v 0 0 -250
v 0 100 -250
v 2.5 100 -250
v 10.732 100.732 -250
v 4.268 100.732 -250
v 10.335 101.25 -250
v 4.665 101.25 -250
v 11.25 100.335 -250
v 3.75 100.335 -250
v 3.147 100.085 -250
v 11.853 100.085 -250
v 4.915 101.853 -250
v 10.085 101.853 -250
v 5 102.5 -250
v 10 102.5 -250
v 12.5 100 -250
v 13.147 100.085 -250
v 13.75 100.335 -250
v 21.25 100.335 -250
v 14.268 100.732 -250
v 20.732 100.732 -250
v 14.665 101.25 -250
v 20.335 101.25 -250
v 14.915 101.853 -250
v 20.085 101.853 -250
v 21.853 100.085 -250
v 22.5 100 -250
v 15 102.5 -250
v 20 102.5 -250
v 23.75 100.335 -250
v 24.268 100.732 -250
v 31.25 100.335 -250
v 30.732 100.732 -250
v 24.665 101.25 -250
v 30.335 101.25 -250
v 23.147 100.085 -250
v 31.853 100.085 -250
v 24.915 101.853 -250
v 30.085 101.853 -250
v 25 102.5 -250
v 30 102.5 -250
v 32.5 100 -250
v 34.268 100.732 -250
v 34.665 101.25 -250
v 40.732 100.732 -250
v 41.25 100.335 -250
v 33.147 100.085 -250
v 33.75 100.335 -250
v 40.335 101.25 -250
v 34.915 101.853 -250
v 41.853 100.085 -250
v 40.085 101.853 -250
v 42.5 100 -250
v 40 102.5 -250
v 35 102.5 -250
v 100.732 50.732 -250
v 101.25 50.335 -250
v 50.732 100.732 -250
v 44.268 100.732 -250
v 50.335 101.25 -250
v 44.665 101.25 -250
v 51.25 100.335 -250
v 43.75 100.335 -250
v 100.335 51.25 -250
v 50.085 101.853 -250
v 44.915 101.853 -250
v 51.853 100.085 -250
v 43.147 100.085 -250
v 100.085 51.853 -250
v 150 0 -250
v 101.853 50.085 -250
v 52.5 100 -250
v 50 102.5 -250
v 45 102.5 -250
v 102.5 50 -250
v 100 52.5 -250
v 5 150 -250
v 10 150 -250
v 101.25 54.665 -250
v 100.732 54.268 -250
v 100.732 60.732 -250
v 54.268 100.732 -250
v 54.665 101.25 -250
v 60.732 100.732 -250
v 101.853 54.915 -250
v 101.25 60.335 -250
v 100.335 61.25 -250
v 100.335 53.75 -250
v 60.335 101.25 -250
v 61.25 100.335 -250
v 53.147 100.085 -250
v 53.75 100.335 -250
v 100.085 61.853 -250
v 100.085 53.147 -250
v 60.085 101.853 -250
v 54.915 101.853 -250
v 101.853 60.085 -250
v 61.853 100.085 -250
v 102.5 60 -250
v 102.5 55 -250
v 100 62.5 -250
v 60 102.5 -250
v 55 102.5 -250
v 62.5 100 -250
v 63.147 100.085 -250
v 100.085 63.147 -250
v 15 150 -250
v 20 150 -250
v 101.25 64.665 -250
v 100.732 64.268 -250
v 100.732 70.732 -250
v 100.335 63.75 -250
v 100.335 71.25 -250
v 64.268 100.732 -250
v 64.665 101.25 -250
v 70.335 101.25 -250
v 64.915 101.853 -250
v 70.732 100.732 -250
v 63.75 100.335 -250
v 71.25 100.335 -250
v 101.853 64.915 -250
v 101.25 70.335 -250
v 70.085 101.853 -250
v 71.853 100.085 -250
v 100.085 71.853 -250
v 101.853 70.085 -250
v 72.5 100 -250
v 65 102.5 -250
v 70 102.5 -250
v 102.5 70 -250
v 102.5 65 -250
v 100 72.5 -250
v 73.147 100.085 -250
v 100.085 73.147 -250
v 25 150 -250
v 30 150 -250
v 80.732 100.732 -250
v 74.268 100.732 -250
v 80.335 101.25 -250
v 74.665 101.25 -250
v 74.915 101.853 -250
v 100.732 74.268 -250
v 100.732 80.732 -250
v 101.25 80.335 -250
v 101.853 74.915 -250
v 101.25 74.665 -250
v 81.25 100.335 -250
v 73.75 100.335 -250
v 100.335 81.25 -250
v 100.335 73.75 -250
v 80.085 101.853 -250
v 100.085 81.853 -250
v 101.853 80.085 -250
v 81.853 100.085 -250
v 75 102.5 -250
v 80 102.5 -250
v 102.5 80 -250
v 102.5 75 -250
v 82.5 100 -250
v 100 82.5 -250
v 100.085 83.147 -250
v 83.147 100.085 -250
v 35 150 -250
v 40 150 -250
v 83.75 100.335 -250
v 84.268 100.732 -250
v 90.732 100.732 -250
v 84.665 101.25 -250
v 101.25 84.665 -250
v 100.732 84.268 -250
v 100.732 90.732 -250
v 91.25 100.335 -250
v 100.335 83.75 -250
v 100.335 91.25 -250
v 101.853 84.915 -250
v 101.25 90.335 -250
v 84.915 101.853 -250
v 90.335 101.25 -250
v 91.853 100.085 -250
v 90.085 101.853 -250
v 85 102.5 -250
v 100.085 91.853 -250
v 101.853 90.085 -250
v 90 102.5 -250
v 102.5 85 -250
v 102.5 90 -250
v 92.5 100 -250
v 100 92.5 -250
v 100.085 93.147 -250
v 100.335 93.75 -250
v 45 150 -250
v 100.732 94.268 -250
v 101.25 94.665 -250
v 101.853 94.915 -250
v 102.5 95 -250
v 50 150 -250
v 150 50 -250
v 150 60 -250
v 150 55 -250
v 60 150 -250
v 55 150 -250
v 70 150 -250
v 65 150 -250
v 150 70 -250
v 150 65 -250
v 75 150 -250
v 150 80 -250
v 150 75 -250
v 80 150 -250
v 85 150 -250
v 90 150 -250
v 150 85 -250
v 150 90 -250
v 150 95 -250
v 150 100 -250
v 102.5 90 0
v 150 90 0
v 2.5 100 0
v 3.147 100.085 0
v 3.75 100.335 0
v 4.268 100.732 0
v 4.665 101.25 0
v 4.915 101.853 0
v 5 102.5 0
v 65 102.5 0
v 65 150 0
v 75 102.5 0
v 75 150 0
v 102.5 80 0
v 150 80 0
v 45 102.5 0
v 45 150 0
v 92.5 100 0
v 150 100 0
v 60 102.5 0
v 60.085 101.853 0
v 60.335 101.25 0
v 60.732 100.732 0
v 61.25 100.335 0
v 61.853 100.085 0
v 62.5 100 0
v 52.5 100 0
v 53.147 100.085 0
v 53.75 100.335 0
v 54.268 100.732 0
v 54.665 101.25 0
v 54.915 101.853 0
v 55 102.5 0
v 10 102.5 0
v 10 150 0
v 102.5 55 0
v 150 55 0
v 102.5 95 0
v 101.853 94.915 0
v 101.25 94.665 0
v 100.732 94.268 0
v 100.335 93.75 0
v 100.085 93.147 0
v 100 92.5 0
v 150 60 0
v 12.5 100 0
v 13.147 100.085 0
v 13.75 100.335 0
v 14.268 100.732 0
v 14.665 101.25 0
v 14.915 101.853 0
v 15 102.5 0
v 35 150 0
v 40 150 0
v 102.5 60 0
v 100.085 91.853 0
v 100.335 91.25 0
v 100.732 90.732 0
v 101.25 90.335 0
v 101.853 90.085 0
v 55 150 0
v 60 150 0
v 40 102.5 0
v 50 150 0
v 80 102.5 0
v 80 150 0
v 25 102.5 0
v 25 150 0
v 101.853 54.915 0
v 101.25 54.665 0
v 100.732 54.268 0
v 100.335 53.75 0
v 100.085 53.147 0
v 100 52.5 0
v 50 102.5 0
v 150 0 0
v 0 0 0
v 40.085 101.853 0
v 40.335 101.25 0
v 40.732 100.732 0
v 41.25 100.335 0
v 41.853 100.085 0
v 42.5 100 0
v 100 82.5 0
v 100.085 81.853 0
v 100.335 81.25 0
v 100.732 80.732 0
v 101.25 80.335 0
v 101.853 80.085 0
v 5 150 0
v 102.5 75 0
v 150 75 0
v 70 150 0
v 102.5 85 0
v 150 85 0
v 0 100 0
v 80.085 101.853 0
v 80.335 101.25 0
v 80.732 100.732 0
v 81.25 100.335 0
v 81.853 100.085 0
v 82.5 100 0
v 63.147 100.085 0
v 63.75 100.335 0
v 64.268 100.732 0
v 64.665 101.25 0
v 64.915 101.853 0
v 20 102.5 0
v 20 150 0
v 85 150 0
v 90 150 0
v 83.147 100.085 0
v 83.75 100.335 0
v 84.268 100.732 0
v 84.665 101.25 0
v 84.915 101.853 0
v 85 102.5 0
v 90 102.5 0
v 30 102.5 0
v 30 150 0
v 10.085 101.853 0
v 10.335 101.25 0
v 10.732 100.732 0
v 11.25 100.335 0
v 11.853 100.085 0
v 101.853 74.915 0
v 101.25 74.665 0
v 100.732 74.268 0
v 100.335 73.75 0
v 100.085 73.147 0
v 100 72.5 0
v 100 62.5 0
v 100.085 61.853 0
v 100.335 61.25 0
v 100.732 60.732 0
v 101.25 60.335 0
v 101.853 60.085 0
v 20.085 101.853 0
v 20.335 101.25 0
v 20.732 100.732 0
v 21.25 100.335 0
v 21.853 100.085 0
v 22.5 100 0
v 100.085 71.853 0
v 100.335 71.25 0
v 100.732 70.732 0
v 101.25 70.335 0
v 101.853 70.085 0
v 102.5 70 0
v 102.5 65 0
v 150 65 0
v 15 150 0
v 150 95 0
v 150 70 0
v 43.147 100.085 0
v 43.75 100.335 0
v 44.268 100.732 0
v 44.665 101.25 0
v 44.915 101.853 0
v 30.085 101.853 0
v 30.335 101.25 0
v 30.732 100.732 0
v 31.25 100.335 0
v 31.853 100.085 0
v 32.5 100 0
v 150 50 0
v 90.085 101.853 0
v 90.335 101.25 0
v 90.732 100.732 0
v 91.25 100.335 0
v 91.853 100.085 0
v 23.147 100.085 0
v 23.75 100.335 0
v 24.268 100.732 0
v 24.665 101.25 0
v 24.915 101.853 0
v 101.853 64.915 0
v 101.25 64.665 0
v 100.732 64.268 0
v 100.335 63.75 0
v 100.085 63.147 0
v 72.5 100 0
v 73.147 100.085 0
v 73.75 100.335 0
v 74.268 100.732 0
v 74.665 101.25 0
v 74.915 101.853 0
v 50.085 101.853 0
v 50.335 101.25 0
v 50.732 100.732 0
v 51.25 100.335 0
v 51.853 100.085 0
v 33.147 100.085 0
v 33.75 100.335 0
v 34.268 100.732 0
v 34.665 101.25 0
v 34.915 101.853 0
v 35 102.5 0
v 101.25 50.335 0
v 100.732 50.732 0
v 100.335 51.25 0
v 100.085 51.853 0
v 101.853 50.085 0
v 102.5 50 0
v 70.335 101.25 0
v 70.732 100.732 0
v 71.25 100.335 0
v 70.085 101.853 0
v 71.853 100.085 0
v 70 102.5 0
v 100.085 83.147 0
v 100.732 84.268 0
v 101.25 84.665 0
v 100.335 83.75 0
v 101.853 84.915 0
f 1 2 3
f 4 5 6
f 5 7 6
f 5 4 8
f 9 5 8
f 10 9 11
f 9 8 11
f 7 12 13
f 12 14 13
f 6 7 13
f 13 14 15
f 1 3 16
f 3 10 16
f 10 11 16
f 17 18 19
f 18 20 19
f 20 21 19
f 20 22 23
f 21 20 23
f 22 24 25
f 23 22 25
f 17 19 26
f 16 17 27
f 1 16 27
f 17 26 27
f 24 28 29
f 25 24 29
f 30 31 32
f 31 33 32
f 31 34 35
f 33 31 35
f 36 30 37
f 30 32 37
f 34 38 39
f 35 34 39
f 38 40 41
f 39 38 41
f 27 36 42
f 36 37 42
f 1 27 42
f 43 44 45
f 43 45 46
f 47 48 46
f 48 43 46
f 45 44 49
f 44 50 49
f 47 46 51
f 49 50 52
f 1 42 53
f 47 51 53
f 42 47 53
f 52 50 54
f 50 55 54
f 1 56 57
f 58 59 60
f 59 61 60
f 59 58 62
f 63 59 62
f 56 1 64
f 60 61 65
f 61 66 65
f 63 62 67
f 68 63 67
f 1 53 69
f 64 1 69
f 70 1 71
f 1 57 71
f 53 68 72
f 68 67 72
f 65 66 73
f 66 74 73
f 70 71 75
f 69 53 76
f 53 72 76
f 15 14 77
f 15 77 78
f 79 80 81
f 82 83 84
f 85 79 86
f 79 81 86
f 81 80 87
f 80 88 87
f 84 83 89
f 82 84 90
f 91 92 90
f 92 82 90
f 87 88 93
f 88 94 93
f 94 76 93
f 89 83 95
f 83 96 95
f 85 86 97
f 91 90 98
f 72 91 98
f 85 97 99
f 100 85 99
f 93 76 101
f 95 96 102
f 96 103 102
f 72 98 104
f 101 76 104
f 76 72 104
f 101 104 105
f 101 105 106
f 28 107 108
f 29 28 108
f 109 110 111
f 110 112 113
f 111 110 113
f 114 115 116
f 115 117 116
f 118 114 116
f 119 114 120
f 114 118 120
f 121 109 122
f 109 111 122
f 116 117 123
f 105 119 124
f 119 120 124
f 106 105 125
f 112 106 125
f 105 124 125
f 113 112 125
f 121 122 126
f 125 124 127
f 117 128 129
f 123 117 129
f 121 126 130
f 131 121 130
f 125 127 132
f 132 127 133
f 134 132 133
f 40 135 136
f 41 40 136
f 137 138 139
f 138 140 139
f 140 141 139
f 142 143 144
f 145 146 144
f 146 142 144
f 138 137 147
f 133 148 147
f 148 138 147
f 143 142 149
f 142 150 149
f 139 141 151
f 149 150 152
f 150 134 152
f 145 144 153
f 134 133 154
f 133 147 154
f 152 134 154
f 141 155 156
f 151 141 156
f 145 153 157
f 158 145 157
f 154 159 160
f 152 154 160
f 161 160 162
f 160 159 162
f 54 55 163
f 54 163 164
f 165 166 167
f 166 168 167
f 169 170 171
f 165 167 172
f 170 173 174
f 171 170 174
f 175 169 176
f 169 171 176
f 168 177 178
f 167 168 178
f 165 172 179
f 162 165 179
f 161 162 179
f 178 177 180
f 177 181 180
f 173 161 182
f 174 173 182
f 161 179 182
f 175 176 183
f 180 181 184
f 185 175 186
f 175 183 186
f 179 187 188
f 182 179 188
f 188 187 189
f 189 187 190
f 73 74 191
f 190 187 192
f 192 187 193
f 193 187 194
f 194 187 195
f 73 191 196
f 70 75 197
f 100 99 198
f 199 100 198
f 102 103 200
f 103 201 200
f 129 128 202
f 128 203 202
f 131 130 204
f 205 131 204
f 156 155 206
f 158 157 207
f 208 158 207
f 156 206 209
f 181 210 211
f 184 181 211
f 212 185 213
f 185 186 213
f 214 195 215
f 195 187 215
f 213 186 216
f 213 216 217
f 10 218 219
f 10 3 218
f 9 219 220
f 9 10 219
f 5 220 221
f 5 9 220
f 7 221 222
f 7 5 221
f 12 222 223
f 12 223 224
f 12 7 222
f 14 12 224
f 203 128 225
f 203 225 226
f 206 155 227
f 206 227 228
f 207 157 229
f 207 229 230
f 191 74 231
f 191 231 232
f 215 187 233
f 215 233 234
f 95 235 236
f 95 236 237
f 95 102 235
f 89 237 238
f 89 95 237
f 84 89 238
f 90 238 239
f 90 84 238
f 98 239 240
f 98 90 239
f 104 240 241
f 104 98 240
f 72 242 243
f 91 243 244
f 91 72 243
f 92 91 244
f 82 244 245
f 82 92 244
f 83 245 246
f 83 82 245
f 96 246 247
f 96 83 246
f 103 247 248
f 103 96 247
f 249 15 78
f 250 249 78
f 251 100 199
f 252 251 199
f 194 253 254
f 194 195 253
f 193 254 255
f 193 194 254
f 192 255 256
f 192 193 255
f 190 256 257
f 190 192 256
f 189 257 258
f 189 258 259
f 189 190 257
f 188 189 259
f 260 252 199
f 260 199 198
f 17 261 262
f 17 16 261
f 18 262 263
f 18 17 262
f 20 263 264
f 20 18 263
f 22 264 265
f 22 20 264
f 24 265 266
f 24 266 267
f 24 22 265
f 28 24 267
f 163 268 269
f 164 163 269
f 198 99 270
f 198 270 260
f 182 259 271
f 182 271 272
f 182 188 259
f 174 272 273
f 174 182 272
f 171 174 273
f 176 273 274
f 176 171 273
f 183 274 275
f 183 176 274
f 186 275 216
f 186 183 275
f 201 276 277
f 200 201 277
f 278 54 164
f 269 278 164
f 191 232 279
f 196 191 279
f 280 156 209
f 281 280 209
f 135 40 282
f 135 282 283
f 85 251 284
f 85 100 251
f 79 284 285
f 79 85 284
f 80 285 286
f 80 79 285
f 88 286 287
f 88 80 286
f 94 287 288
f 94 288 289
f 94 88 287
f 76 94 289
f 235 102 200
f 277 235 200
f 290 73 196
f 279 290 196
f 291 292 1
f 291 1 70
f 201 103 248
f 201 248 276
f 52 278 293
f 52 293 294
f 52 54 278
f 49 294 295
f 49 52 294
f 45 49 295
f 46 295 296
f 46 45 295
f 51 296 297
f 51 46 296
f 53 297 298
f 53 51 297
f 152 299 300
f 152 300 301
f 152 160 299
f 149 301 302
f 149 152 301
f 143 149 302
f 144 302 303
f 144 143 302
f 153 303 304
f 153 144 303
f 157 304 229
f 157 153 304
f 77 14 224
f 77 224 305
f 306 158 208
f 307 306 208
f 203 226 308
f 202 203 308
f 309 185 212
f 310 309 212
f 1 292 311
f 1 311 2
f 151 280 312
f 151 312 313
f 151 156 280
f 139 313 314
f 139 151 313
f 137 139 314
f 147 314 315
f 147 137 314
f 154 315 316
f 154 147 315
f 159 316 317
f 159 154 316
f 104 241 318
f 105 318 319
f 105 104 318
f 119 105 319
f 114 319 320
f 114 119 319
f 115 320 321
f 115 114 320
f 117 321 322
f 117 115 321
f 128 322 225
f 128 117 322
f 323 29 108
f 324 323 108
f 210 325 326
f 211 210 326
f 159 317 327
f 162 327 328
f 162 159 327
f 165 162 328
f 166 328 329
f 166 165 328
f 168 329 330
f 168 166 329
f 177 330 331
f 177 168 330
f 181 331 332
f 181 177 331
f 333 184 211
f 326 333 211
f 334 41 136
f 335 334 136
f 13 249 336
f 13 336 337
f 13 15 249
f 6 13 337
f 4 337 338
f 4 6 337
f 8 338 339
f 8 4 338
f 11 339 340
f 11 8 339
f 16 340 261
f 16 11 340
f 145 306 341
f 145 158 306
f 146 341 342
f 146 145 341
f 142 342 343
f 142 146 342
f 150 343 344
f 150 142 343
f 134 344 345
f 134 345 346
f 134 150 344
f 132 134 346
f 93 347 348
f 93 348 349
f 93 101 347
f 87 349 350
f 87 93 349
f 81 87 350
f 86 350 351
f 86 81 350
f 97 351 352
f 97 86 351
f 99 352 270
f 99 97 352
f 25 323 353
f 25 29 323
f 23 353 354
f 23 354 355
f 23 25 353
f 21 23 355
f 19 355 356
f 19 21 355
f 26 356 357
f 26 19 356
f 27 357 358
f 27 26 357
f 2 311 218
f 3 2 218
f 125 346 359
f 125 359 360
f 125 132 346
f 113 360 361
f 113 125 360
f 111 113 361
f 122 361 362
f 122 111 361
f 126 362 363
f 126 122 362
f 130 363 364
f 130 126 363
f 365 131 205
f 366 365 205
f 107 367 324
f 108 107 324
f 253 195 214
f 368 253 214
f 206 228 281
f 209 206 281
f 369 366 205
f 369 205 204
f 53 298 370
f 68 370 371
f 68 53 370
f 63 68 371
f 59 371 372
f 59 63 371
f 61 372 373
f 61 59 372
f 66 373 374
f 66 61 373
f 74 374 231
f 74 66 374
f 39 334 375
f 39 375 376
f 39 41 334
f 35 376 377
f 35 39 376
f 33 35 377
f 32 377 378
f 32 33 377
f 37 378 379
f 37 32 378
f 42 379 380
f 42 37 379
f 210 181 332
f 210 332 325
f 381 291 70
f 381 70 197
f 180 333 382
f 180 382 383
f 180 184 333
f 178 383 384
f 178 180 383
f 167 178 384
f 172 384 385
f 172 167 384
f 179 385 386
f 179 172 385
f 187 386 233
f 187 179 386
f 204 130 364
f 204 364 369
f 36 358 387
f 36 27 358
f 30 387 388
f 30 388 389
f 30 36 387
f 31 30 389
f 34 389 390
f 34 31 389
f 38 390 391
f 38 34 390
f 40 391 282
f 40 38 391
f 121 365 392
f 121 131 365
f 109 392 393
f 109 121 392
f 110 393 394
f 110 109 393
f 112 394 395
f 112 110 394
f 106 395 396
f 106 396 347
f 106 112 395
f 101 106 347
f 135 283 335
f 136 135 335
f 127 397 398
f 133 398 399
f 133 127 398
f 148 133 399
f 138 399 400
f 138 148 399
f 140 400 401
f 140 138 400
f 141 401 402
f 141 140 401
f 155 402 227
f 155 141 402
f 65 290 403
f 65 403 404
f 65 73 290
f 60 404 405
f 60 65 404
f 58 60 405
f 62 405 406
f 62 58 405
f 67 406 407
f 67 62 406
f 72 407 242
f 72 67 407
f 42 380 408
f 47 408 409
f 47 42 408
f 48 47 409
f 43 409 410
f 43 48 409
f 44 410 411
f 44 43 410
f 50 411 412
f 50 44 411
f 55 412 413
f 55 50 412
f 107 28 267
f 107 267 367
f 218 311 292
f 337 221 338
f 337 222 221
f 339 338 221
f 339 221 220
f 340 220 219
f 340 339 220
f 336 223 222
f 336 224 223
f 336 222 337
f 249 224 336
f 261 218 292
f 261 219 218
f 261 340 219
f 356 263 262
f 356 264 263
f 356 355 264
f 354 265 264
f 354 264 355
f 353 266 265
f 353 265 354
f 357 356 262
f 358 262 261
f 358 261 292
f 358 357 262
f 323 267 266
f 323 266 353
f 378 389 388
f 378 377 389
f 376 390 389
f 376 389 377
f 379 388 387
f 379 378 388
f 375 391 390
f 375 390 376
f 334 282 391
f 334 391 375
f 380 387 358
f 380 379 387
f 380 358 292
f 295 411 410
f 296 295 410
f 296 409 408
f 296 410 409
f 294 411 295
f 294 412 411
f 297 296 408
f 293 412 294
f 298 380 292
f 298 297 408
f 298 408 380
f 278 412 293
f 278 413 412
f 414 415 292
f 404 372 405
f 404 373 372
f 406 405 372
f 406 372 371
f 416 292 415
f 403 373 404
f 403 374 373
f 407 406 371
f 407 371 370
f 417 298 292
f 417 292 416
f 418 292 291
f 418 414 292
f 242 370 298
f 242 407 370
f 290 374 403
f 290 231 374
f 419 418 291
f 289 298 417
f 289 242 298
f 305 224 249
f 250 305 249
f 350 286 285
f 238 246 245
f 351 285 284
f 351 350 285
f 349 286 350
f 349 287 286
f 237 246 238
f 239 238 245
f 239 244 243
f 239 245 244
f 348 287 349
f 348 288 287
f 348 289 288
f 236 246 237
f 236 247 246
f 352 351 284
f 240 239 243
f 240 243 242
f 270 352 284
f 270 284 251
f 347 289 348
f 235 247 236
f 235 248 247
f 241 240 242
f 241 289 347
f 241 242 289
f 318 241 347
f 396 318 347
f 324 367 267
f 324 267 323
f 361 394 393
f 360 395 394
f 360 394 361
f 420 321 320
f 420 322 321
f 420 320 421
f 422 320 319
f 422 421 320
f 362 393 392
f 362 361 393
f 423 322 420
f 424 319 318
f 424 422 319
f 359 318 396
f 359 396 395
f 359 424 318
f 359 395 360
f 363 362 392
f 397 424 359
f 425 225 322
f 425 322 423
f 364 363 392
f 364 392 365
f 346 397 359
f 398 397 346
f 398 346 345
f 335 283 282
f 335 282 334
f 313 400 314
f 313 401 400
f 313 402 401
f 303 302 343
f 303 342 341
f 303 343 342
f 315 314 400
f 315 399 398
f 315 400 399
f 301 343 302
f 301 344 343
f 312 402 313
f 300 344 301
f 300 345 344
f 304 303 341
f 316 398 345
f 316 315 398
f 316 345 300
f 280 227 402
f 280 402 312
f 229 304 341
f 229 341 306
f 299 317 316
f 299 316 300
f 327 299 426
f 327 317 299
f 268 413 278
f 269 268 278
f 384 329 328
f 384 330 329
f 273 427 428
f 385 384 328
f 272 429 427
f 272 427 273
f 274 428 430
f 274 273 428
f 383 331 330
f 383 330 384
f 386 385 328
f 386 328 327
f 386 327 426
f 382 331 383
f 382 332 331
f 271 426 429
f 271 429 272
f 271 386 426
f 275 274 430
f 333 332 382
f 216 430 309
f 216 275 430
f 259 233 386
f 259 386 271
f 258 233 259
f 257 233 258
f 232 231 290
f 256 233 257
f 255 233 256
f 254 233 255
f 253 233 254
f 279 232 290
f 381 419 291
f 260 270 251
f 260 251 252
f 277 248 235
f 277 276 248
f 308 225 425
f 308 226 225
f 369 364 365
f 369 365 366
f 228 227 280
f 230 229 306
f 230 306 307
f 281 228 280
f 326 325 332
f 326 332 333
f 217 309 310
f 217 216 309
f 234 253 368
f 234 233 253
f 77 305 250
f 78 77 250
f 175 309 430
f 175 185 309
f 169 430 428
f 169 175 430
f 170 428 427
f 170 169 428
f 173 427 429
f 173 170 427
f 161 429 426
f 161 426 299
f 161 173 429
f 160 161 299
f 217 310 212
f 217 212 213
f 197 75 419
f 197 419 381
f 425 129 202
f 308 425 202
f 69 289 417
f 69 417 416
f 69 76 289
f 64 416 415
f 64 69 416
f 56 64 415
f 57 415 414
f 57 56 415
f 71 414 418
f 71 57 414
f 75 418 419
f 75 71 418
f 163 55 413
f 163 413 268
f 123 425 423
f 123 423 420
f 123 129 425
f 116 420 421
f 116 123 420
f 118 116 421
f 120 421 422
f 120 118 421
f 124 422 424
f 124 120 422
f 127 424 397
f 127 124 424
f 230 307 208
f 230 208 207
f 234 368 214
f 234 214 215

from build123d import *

# Parameters (mm, degrees)
SKETCH1_W           = 100
SKETCH1_H           = 250
BOSS_EXTRUDE1_DEPTH = 100
SKETCH2_W           = 50
SKETCH2_H           = 5
SKETCH2_W_2         = 5
SKETCH2_H_2         = 50
BOSS_EXTRUDE2_DEPTH = 250
FILLET3_R           = 2.5
FILLET4_R           = 2.5


with BuildPart() as part:
    # Sketch1 → Boss-Extrude1 (new body)
    with BuildSketch(Plane(origin=(0, 0, 0), x_dir=(1, 0, 0), z_dir=(0, 1, 0))):
        with Locations((50, 125)):
            Rectangle(SKETCH1_W, SKETCH1_H)
    extrude(amount=BOSS_EXTRUDE1_DEPTH)

    # Sketch2 → Boss-Extrude2 (add)
    with BuildSketch(Plane.XY):
        with Locations((125, 87.5)):
            Rectangle(SKETCH2_W, SKETCH2_H)
        with Locations((125, 97.5)):
            Rectangle(SKETCH2_W, SKETCH2_H)
        with Locations((125, 77.5)):
            Rectangle(SKETCH2_W, SKETCH2_H)
        with Locations((125, 67.5)):
            Rectangle(SKETCH2_W, SKETCH2_H)
        with Locations((17.5, 125)):
            Rectangle(SKETCH2_W_2, SKETCH2_H_2)
        with Locations((7.5, 125)):
            Rectangle(SKETCH2_W_2, SKETCH2_H_2)
        with Locations((27.5, 125)):
            Rectangle(SKETCH2_W_2, SKETCH2_H_2)
        with Locations((37.5, 125)):
            Rectangle(SKETCH2_W_2, SKETCH2_H_2)
        with Locations((47.5, 125)):
            Rectangle(SKETCH2_W_2, SKETCH2_H_2)
        with Locations((57.5, 125)):
            Rectangle(SKETCH2_W_2, SKETCH2_H_2)
        with Locations((67.5, 125)):
            Rectangle(SKETCH2_W_2, SKETCH2_H_2)
        with Locations((77.5, 125)):
            Rectangle(SKETCH2_W_2, SKETCH2_H_2)
        with Locations((87.5, 125)):
            Rectangle(SKETCH2_W_2, SKETCH2_H_2)
        with Locations((125, 25)):
            Rectangle(SKETCH2_W, SKETCH2_H_2)
        with Locations((125, 57.5)):
            Rectangle(SKETCH2_W, SKETCH2_H)
    extrude(amount=-BOSS_EXTRUDE2_DEPTH)

    # Fillet3
    fillet3_edges = [part.edges().sort_by_distance(p)[0] for p in [
        (80, 100, -125),
        (75, 100, -125),
        (90, 100, -125),
        (85, 100, -125),
        (5, 100, -125),
        (10, 100, -125),
        (20, 100, -125),
        (15, 100, -125),
        (30, 100, -125),
        (25, 100, -125),
        (40, 100, -125),
        (35, 100, -125),
        (50, 100, -125),
        (45, 100, -125),
        (60, 100, -125),
        (55, 100, -125),
        (70, 100, -125),
        (65, 100, -125),
    ]]
    fillet(fillet3_edges, radius=FILLET3_R - 0.0001)  # a hair under: the kernel refuses the full size

    # Fillet4
    fillet4_edges = [part.edges().sort_by_distance(p)[0] for p in [
        (100, 55, -125),
        (100, 65, -125),
        (100, 75, -125),
        (100, 85, -125),
        (100, 95, -125),
        (100, 90, -125),
        (100, 80, -125),
        (100, 70, -125),
        (100, 60, -125),
        (100, 50, -125),
    ]]
    fillet(fillet4_edges, radius=FILLET4_R - 0.0001)  # a hair under: the kernel refuses the full size


solid = part.part
